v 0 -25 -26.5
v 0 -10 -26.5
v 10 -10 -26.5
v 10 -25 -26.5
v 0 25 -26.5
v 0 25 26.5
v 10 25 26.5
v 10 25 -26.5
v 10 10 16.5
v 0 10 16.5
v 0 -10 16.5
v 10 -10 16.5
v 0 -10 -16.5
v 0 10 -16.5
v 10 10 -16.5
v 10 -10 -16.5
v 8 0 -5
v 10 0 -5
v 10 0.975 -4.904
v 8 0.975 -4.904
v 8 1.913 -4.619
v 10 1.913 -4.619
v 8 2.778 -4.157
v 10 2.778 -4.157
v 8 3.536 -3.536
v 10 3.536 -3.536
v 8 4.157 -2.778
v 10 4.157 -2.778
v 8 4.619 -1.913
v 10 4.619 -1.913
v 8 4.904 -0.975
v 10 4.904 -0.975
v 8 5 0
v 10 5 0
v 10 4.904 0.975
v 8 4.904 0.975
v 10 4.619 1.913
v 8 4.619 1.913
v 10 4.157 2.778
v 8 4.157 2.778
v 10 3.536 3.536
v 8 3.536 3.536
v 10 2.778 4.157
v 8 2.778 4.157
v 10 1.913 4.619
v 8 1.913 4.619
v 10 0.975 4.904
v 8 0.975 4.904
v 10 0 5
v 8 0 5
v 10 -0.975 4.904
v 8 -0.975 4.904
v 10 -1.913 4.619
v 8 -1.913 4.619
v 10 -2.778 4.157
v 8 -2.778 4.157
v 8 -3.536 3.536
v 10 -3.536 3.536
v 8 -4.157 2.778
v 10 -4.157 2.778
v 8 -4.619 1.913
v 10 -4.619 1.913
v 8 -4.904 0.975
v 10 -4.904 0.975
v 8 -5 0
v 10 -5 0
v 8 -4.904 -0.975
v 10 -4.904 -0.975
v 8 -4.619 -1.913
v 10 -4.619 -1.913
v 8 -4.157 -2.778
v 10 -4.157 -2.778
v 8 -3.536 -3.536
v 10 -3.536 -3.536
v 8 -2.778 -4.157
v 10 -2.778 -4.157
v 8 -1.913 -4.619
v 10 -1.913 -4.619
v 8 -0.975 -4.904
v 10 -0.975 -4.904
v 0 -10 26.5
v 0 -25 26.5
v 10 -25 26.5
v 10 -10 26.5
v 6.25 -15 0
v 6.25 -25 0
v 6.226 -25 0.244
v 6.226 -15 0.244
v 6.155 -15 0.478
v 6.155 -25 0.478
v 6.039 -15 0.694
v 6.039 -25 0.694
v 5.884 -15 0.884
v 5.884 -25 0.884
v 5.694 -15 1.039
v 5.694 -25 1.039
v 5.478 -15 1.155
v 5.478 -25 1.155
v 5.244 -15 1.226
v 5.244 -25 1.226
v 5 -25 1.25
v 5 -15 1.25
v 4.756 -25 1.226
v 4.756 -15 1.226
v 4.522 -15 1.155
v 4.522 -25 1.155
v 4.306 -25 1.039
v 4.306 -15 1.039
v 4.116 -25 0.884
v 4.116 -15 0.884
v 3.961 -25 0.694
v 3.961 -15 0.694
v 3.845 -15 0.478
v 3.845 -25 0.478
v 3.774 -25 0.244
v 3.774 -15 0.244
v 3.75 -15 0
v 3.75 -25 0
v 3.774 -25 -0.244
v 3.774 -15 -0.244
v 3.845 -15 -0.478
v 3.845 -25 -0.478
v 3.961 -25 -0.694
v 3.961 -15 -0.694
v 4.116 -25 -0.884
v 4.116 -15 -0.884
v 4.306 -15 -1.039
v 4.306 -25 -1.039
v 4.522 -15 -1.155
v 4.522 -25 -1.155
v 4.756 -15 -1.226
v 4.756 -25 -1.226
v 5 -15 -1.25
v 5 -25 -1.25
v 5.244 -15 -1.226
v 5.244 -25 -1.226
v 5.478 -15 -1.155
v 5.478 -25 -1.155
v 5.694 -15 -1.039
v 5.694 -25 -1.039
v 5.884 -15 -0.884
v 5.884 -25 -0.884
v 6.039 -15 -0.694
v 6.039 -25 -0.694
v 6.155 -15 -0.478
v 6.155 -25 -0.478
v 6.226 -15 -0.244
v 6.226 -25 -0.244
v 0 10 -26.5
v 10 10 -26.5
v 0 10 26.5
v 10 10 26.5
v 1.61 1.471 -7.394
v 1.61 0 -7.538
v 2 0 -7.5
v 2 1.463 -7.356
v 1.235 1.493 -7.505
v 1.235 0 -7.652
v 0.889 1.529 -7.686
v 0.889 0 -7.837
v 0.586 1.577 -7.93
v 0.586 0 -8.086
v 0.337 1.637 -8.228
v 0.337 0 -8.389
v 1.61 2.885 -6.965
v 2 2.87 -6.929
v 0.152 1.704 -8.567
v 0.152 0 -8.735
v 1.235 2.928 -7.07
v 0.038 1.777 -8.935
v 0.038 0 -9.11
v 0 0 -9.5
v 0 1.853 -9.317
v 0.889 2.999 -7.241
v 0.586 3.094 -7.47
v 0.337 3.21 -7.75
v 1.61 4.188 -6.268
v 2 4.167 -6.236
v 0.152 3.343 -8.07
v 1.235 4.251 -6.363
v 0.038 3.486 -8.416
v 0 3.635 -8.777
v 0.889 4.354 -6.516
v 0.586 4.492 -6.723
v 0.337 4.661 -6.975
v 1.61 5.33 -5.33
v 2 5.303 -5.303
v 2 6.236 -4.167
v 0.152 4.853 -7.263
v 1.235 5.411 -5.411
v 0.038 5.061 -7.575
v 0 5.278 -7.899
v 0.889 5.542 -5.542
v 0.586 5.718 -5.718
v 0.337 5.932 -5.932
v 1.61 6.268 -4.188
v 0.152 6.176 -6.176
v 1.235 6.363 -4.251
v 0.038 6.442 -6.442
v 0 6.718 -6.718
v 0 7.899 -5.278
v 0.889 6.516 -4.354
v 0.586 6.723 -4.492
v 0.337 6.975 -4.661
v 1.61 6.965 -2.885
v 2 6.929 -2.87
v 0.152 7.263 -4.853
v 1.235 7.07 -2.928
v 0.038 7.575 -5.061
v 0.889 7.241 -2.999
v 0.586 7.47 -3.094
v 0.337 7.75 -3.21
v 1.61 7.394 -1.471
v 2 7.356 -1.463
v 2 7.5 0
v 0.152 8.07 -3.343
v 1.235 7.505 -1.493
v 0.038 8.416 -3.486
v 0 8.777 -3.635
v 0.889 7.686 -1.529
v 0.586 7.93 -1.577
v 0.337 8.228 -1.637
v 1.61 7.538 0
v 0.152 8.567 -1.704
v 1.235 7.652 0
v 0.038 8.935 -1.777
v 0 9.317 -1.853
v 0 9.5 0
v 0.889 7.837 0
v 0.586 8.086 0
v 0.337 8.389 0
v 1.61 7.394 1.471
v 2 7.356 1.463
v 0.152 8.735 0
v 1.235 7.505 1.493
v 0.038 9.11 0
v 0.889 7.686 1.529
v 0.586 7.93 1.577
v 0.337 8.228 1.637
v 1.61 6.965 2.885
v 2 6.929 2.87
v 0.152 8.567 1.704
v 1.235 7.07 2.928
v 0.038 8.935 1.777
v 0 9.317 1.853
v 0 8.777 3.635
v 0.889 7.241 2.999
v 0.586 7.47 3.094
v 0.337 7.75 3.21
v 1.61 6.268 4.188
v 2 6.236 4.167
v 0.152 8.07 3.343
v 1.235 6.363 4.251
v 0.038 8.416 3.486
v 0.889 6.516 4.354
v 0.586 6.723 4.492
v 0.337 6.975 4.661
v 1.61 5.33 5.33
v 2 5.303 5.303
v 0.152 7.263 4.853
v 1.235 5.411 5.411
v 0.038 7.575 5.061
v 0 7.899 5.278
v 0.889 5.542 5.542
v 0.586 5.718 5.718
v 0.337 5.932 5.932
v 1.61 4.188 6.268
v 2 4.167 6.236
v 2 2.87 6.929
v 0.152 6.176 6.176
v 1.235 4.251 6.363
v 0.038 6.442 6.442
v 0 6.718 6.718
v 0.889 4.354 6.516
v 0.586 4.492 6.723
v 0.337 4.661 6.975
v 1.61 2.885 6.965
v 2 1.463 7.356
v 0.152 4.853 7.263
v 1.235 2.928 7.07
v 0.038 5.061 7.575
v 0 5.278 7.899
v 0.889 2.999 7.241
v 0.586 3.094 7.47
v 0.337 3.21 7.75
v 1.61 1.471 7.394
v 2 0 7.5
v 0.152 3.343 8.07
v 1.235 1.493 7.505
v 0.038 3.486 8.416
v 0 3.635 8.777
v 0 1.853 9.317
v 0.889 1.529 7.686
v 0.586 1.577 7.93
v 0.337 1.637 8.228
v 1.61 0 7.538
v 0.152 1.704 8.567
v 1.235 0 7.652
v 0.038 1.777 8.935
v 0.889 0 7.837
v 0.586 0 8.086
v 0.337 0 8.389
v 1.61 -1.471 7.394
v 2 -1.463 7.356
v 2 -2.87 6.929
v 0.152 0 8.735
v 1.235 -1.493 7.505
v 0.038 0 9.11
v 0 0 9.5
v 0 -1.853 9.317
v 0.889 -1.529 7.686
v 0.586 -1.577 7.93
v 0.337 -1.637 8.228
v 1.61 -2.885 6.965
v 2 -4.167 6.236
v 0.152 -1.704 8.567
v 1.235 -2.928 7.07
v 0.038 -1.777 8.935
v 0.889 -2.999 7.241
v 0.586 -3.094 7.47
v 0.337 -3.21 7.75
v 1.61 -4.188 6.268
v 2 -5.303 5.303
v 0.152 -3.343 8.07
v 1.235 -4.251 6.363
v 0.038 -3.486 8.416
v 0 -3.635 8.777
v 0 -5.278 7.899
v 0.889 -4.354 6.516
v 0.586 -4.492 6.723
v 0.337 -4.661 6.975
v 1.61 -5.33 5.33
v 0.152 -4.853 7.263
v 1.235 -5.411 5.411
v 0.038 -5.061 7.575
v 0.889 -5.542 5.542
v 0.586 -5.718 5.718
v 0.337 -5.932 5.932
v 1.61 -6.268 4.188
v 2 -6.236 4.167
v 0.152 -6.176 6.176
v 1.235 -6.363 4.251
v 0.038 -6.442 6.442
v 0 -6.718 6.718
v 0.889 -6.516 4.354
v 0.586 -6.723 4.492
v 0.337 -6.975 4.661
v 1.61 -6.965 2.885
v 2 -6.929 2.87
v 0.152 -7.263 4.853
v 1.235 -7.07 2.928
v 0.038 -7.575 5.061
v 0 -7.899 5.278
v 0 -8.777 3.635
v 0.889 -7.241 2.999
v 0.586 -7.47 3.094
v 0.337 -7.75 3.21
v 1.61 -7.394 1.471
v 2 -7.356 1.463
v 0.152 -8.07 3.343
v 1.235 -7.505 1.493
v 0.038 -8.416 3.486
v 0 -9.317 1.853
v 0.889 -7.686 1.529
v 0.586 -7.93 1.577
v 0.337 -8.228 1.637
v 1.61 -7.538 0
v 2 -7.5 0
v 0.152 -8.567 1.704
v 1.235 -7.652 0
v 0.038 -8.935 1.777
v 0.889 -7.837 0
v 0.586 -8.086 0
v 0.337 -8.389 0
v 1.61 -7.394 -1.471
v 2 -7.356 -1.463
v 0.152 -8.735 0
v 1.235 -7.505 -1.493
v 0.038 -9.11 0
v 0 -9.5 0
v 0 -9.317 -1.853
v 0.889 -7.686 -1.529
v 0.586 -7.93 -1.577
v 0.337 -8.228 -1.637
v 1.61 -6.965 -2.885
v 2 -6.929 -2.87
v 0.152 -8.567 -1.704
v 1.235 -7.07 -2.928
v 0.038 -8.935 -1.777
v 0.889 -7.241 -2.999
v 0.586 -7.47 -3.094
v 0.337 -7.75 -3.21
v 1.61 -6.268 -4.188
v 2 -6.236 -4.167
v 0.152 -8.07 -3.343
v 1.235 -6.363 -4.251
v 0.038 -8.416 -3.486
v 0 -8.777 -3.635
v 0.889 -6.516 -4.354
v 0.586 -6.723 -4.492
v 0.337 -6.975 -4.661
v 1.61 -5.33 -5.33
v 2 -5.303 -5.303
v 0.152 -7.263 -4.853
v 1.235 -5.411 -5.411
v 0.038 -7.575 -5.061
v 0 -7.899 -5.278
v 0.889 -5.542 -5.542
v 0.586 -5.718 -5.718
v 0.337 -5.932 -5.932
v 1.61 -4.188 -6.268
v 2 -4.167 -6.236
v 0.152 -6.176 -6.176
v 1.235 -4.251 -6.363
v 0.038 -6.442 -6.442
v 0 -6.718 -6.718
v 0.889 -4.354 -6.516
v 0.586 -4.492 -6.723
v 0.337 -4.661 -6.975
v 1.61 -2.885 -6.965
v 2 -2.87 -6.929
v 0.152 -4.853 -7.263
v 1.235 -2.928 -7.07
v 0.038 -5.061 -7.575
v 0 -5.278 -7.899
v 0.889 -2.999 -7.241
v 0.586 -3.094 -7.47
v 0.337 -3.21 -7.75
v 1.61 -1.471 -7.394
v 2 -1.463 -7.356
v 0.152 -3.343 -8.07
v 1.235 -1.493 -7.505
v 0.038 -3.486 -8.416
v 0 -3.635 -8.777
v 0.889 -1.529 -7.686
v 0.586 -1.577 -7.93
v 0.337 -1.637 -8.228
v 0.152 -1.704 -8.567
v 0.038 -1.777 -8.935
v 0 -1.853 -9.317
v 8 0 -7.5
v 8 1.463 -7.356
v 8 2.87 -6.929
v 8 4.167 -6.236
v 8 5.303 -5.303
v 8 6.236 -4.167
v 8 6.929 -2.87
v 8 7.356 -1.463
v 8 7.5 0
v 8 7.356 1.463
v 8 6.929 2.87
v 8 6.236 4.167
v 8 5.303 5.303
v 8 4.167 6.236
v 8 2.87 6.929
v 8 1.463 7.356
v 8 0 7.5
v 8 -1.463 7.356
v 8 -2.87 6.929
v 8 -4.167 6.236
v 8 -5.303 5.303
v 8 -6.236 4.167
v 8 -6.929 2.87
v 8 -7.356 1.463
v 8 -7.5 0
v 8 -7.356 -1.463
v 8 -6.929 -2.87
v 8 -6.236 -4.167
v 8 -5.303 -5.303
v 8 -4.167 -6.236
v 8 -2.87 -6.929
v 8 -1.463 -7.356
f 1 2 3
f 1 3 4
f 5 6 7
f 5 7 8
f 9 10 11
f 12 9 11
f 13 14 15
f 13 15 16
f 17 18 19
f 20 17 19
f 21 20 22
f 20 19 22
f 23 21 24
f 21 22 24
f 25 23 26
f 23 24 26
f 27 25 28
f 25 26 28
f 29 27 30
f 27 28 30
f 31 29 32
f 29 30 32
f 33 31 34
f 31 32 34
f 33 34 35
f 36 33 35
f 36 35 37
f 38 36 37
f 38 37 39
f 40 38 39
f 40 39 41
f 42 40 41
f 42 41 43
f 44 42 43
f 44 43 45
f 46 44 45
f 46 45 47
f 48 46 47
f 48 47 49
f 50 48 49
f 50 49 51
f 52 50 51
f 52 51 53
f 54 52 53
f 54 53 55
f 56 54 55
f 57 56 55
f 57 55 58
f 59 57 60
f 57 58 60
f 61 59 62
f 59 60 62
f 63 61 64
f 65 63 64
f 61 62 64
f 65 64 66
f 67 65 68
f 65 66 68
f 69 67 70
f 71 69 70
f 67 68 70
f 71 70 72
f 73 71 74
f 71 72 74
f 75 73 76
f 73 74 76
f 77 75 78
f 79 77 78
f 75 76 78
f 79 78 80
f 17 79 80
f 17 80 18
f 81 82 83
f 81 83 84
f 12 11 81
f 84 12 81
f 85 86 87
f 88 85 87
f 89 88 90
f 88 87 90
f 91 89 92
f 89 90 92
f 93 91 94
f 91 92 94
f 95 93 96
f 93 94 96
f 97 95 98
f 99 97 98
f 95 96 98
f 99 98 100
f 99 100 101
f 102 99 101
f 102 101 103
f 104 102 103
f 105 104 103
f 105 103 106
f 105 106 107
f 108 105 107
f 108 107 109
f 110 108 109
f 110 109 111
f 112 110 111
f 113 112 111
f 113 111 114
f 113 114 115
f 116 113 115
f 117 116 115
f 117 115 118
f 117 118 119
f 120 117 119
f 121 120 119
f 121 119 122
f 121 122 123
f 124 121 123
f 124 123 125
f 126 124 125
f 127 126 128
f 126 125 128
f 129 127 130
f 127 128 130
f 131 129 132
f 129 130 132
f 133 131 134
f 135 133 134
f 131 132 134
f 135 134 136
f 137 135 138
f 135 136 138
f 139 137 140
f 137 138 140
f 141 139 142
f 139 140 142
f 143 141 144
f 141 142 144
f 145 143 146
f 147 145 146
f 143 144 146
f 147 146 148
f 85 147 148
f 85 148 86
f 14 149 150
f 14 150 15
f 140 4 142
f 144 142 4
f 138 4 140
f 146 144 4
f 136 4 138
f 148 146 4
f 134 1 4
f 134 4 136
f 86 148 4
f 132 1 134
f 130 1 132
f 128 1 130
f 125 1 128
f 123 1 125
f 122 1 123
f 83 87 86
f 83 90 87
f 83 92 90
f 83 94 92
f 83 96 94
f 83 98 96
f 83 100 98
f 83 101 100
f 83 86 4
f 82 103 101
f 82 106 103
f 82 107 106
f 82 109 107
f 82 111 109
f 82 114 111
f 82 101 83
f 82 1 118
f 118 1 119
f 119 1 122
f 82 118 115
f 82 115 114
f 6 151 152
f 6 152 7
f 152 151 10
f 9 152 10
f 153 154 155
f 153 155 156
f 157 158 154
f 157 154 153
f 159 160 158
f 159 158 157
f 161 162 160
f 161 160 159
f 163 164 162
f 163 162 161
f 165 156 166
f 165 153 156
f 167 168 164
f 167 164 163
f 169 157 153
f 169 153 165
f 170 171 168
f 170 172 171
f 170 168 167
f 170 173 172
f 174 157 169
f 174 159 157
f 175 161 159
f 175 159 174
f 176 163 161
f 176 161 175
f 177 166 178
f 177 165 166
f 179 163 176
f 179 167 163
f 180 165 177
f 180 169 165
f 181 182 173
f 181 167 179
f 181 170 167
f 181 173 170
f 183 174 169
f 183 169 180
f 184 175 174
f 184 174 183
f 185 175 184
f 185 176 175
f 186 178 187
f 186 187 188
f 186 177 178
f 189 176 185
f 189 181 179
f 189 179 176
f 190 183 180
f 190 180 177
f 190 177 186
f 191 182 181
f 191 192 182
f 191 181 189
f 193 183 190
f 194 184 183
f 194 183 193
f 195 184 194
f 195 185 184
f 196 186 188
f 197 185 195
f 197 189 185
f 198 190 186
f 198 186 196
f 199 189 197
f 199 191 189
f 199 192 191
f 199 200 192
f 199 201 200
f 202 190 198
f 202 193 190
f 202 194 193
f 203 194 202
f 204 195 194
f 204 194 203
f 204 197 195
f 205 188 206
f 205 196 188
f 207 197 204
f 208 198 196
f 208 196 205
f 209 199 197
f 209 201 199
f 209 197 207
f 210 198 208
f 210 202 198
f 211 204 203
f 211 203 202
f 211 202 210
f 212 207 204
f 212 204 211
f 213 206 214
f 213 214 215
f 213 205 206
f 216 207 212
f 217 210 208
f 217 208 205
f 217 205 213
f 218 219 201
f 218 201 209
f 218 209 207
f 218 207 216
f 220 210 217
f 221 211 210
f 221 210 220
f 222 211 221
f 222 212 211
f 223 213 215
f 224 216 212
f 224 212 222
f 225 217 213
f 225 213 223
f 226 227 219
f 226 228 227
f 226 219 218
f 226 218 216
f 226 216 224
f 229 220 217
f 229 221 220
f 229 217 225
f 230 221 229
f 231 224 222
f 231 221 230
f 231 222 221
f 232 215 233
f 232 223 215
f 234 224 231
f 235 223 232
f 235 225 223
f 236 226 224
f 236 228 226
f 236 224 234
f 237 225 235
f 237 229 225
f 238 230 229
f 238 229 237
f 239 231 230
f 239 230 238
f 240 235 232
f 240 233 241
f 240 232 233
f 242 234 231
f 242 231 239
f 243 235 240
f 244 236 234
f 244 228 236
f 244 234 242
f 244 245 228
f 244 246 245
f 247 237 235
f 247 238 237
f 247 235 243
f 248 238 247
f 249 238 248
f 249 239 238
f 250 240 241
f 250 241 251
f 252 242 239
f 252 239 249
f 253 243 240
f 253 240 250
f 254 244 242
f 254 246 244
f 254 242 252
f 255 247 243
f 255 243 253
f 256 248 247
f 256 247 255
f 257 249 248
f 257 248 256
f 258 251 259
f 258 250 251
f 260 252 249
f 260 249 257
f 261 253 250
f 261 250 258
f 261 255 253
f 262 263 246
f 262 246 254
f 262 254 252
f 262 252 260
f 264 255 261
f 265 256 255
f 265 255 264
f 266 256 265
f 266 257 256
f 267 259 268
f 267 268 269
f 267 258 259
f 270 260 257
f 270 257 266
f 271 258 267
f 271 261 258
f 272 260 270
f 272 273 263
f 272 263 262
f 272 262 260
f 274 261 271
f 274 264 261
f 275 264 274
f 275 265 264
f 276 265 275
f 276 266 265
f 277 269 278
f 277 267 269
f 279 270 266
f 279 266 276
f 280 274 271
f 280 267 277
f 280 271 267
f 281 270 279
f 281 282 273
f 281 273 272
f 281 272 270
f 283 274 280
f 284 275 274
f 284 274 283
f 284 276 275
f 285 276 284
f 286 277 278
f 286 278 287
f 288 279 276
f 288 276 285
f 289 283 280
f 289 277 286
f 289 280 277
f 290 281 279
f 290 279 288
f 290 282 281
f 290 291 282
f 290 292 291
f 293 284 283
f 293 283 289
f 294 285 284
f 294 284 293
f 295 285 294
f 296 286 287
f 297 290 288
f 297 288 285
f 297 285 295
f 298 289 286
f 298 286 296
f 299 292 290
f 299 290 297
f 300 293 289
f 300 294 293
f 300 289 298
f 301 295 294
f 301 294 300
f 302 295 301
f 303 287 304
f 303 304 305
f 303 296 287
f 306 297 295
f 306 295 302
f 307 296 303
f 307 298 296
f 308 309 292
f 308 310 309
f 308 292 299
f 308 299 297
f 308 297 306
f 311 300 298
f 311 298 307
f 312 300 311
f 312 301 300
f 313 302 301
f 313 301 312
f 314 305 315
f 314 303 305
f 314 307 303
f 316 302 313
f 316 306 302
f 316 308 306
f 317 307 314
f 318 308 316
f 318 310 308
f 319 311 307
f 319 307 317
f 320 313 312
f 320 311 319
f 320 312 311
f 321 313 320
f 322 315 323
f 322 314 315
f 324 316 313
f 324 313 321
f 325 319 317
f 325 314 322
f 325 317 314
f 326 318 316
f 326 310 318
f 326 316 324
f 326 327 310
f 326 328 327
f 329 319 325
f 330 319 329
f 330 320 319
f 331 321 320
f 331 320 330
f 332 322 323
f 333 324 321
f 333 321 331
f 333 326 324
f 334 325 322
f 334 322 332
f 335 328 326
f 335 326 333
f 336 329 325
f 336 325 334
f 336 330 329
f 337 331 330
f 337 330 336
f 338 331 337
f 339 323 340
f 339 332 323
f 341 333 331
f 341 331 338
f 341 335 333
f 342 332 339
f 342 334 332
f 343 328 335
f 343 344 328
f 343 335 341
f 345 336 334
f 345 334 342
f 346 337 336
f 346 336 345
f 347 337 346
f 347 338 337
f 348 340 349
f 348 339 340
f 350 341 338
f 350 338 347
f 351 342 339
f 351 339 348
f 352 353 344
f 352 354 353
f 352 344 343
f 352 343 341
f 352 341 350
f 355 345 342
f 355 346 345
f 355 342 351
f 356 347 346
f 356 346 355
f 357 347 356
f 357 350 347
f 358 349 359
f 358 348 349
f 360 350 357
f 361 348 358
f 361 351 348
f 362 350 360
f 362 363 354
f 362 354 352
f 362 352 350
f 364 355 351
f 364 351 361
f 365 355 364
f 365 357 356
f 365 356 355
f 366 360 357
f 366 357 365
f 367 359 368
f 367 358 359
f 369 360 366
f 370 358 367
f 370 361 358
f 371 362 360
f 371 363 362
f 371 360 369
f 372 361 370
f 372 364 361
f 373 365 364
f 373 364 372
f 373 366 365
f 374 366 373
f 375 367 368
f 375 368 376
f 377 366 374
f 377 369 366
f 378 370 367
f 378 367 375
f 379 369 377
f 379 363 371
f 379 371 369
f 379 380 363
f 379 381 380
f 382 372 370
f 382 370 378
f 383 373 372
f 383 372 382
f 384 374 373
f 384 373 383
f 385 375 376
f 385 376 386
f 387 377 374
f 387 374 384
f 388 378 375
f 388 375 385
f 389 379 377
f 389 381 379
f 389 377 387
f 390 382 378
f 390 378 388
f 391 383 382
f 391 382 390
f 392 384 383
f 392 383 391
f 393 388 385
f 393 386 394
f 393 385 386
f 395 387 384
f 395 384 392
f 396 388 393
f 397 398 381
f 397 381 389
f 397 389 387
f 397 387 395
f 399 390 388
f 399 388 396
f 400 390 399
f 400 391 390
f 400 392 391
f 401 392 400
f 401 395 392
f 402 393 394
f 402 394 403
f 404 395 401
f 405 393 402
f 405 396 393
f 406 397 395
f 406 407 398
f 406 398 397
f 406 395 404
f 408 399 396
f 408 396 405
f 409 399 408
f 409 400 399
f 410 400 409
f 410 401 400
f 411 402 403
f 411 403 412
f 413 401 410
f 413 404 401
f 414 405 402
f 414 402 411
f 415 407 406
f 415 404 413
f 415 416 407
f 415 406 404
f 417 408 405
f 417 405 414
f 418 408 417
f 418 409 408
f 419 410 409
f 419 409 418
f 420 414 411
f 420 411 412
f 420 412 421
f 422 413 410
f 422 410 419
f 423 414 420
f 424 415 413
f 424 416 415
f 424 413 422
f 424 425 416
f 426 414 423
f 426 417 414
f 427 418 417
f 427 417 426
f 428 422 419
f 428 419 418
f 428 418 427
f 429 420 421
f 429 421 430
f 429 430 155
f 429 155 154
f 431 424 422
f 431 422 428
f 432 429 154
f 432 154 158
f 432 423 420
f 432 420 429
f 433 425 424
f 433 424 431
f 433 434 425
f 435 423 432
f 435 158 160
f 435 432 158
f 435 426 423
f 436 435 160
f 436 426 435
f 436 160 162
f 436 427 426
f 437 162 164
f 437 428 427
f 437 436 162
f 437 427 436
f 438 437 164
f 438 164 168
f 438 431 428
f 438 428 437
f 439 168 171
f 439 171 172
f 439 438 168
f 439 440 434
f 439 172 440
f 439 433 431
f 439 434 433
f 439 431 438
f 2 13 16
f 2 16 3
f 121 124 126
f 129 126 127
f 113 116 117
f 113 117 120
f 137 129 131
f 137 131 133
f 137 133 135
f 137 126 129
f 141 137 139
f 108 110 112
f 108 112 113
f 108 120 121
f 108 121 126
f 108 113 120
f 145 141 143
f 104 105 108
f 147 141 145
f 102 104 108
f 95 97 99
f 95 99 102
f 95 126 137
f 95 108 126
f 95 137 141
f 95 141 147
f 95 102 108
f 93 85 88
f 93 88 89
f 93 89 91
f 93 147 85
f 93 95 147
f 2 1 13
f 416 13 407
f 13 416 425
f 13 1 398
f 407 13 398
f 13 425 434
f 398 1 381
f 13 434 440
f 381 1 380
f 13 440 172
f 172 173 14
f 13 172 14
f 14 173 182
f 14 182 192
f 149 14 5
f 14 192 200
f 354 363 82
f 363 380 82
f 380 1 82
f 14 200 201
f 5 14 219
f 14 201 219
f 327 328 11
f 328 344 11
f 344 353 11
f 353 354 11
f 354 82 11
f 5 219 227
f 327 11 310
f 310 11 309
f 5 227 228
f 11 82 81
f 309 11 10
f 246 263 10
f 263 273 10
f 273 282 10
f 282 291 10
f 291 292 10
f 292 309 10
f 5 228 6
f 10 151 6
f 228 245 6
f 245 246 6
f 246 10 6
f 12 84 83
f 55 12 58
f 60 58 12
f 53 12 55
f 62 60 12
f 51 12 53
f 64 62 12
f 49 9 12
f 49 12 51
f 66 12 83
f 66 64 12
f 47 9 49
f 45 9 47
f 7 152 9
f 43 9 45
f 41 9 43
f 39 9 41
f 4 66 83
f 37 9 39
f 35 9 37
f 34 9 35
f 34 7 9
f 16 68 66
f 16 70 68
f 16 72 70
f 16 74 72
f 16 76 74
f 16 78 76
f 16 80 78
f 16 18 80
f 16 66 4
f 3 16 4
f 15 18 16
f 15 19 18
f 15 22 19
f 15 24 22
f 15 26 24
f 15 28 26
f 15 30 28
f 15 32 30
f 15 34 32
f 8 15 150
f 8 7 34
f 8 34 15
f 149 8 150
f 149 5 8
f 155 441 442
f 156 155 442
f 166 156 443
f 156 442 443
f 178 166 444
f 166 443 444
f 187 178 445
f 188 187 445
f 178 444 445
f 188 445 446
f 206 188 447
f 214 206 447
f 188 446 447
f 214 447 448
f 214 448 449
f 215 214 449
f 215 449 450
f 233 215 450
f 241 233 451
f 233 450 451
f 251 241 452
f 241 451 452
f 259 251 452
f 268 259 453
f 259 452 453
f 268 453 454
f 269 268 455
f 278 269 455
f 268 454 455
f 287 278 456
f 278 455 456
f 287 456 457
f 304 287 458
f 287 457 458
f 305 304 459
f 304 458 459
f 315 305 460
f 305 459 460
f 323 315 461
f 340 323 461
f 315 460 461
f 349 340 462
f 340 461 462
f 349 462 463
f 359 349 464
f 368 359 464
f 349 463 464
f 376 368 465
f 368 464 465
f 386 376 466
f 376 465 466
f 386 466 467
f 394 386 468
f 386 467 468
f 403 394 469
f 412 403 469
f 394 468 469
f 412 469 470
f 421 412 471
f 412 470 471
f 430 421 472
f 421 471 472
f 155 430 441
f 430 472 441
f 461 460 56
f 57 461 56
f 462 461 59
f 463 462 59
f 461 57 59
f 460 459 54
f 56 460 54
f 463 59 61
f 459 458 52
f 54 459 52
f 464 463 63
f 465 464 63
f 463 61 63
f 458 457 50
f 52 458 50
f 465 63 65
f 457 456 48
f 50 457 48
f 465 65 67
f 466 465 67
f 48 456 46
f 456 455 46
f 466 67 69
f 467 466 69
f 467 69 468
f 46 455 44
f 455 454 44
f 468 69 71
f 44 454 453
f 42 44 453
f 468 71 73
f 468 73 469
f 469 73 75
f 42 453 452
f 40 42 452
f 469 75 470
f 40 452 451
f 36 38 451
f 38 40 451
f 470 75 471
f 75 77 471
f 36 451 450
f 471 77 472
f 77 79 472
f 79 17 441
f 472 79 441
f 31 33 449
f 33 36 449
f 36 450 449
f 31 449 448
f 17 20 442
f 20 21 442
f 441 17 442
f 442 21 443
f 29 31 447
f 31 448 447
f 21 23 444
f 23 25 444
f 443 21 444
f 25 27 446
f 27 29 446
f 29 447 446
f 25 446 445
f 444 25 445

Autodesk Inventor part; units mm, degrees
ref_plane "YZ Plane" through (0, 0, 0) normal (1, 0, 0) x (0, 1, 0)
ref_plane "XZ Plane" through (0, 0, 0) normal (0, 1, 0) x (-1, 0, 0)
ref_plane "XY Plane" through (0, 0, 0) normal (0, 0, 1) x (1, 0, 0)
sketch "Sketch3" plane through (0, 0, 0) normal (1, 0, 0) x (0, 1, 0)
  line L0 (25, -26.5) -> (-25, -26.5)
  line L1 (-25, -26.5) -> (-25, 26.5)
  line L2 (-25, 26.5) -> (25, 26.5)
  line L3 (25, 26.5) -> (25, -26.5)
  line L4 (25, -26.5) -> (-25, 26.5) construction
  line L5 (-25, -26.5) -> (25, 26.5) construction
  line L6 (25, 26.5) -> (10, 26.5)
  line L7 (10, 26.5) -> (10, 16.5)
  line L8 (10, 16.5) -> (-10, 16.5)
  line L9 (-10, 16.5) -> (-10, 26.5)
  line L10 (-10, 26.5) -> (-25, 26.5)
  line L11 (25, -26.5) -> (10, -26.5)
  line L12 (10, -26.5) -> (10, -16.5)
  line L13 (10, -16.5) -> (-10, -16.5)
  line L14 (-10, -16.5) -> (-10, -26.5)
  line L15 (-10, -26.5) -> (-25, -26.5)
  point P0 (0, 0)
  dimension "d0" = 50
  dimension "d1" = 53
  dimension "d2" = 15
  dimension "d3" = 10
  dimension "d4" = 20
  dimension "d5" = 10
  dimension "d6" = 15
  dimension "d7" = 10
  dimension "d8" = 20
  dimension "d9" = 10
  dimension "d10" = 15
extrude "Extrusion1" add sketch "Sketch3" along normal blind 10 contours L0 L12 L13 L14 L1 L2 L9 L8 L7 L3
sketch "Sketch5" plane through (10, 0, 0) normal (1, 0, 0) x (0, 0, -1)
  circle A0 centre (0, 0) radius 7.5
  circle A1 centre (0, 0) radius 5
  dimension "d13" = 15
  dimension "d33" = 10
sketch "Sketch6" plane through (0, -25, -26.5) normal (0, -1, 0) x (1, 0, 0)
  circle A0 centre (5, 26.5) radius 1.25
  dimension "d30" = 2.5
extrude "Extrusion2" cut sketch "Sketch5" against normal blind 10 contours A0 | A1
extrude "Extrusion3" cut sketch "Sketch6" against normal blind 10
extrude "Extrusion4" add sketch "Sketch5" against normal blind 2
fillet "Fillet1" radius 2 1 edges at (0, 0, 7.5)
properties part number "prepazka_kola"
